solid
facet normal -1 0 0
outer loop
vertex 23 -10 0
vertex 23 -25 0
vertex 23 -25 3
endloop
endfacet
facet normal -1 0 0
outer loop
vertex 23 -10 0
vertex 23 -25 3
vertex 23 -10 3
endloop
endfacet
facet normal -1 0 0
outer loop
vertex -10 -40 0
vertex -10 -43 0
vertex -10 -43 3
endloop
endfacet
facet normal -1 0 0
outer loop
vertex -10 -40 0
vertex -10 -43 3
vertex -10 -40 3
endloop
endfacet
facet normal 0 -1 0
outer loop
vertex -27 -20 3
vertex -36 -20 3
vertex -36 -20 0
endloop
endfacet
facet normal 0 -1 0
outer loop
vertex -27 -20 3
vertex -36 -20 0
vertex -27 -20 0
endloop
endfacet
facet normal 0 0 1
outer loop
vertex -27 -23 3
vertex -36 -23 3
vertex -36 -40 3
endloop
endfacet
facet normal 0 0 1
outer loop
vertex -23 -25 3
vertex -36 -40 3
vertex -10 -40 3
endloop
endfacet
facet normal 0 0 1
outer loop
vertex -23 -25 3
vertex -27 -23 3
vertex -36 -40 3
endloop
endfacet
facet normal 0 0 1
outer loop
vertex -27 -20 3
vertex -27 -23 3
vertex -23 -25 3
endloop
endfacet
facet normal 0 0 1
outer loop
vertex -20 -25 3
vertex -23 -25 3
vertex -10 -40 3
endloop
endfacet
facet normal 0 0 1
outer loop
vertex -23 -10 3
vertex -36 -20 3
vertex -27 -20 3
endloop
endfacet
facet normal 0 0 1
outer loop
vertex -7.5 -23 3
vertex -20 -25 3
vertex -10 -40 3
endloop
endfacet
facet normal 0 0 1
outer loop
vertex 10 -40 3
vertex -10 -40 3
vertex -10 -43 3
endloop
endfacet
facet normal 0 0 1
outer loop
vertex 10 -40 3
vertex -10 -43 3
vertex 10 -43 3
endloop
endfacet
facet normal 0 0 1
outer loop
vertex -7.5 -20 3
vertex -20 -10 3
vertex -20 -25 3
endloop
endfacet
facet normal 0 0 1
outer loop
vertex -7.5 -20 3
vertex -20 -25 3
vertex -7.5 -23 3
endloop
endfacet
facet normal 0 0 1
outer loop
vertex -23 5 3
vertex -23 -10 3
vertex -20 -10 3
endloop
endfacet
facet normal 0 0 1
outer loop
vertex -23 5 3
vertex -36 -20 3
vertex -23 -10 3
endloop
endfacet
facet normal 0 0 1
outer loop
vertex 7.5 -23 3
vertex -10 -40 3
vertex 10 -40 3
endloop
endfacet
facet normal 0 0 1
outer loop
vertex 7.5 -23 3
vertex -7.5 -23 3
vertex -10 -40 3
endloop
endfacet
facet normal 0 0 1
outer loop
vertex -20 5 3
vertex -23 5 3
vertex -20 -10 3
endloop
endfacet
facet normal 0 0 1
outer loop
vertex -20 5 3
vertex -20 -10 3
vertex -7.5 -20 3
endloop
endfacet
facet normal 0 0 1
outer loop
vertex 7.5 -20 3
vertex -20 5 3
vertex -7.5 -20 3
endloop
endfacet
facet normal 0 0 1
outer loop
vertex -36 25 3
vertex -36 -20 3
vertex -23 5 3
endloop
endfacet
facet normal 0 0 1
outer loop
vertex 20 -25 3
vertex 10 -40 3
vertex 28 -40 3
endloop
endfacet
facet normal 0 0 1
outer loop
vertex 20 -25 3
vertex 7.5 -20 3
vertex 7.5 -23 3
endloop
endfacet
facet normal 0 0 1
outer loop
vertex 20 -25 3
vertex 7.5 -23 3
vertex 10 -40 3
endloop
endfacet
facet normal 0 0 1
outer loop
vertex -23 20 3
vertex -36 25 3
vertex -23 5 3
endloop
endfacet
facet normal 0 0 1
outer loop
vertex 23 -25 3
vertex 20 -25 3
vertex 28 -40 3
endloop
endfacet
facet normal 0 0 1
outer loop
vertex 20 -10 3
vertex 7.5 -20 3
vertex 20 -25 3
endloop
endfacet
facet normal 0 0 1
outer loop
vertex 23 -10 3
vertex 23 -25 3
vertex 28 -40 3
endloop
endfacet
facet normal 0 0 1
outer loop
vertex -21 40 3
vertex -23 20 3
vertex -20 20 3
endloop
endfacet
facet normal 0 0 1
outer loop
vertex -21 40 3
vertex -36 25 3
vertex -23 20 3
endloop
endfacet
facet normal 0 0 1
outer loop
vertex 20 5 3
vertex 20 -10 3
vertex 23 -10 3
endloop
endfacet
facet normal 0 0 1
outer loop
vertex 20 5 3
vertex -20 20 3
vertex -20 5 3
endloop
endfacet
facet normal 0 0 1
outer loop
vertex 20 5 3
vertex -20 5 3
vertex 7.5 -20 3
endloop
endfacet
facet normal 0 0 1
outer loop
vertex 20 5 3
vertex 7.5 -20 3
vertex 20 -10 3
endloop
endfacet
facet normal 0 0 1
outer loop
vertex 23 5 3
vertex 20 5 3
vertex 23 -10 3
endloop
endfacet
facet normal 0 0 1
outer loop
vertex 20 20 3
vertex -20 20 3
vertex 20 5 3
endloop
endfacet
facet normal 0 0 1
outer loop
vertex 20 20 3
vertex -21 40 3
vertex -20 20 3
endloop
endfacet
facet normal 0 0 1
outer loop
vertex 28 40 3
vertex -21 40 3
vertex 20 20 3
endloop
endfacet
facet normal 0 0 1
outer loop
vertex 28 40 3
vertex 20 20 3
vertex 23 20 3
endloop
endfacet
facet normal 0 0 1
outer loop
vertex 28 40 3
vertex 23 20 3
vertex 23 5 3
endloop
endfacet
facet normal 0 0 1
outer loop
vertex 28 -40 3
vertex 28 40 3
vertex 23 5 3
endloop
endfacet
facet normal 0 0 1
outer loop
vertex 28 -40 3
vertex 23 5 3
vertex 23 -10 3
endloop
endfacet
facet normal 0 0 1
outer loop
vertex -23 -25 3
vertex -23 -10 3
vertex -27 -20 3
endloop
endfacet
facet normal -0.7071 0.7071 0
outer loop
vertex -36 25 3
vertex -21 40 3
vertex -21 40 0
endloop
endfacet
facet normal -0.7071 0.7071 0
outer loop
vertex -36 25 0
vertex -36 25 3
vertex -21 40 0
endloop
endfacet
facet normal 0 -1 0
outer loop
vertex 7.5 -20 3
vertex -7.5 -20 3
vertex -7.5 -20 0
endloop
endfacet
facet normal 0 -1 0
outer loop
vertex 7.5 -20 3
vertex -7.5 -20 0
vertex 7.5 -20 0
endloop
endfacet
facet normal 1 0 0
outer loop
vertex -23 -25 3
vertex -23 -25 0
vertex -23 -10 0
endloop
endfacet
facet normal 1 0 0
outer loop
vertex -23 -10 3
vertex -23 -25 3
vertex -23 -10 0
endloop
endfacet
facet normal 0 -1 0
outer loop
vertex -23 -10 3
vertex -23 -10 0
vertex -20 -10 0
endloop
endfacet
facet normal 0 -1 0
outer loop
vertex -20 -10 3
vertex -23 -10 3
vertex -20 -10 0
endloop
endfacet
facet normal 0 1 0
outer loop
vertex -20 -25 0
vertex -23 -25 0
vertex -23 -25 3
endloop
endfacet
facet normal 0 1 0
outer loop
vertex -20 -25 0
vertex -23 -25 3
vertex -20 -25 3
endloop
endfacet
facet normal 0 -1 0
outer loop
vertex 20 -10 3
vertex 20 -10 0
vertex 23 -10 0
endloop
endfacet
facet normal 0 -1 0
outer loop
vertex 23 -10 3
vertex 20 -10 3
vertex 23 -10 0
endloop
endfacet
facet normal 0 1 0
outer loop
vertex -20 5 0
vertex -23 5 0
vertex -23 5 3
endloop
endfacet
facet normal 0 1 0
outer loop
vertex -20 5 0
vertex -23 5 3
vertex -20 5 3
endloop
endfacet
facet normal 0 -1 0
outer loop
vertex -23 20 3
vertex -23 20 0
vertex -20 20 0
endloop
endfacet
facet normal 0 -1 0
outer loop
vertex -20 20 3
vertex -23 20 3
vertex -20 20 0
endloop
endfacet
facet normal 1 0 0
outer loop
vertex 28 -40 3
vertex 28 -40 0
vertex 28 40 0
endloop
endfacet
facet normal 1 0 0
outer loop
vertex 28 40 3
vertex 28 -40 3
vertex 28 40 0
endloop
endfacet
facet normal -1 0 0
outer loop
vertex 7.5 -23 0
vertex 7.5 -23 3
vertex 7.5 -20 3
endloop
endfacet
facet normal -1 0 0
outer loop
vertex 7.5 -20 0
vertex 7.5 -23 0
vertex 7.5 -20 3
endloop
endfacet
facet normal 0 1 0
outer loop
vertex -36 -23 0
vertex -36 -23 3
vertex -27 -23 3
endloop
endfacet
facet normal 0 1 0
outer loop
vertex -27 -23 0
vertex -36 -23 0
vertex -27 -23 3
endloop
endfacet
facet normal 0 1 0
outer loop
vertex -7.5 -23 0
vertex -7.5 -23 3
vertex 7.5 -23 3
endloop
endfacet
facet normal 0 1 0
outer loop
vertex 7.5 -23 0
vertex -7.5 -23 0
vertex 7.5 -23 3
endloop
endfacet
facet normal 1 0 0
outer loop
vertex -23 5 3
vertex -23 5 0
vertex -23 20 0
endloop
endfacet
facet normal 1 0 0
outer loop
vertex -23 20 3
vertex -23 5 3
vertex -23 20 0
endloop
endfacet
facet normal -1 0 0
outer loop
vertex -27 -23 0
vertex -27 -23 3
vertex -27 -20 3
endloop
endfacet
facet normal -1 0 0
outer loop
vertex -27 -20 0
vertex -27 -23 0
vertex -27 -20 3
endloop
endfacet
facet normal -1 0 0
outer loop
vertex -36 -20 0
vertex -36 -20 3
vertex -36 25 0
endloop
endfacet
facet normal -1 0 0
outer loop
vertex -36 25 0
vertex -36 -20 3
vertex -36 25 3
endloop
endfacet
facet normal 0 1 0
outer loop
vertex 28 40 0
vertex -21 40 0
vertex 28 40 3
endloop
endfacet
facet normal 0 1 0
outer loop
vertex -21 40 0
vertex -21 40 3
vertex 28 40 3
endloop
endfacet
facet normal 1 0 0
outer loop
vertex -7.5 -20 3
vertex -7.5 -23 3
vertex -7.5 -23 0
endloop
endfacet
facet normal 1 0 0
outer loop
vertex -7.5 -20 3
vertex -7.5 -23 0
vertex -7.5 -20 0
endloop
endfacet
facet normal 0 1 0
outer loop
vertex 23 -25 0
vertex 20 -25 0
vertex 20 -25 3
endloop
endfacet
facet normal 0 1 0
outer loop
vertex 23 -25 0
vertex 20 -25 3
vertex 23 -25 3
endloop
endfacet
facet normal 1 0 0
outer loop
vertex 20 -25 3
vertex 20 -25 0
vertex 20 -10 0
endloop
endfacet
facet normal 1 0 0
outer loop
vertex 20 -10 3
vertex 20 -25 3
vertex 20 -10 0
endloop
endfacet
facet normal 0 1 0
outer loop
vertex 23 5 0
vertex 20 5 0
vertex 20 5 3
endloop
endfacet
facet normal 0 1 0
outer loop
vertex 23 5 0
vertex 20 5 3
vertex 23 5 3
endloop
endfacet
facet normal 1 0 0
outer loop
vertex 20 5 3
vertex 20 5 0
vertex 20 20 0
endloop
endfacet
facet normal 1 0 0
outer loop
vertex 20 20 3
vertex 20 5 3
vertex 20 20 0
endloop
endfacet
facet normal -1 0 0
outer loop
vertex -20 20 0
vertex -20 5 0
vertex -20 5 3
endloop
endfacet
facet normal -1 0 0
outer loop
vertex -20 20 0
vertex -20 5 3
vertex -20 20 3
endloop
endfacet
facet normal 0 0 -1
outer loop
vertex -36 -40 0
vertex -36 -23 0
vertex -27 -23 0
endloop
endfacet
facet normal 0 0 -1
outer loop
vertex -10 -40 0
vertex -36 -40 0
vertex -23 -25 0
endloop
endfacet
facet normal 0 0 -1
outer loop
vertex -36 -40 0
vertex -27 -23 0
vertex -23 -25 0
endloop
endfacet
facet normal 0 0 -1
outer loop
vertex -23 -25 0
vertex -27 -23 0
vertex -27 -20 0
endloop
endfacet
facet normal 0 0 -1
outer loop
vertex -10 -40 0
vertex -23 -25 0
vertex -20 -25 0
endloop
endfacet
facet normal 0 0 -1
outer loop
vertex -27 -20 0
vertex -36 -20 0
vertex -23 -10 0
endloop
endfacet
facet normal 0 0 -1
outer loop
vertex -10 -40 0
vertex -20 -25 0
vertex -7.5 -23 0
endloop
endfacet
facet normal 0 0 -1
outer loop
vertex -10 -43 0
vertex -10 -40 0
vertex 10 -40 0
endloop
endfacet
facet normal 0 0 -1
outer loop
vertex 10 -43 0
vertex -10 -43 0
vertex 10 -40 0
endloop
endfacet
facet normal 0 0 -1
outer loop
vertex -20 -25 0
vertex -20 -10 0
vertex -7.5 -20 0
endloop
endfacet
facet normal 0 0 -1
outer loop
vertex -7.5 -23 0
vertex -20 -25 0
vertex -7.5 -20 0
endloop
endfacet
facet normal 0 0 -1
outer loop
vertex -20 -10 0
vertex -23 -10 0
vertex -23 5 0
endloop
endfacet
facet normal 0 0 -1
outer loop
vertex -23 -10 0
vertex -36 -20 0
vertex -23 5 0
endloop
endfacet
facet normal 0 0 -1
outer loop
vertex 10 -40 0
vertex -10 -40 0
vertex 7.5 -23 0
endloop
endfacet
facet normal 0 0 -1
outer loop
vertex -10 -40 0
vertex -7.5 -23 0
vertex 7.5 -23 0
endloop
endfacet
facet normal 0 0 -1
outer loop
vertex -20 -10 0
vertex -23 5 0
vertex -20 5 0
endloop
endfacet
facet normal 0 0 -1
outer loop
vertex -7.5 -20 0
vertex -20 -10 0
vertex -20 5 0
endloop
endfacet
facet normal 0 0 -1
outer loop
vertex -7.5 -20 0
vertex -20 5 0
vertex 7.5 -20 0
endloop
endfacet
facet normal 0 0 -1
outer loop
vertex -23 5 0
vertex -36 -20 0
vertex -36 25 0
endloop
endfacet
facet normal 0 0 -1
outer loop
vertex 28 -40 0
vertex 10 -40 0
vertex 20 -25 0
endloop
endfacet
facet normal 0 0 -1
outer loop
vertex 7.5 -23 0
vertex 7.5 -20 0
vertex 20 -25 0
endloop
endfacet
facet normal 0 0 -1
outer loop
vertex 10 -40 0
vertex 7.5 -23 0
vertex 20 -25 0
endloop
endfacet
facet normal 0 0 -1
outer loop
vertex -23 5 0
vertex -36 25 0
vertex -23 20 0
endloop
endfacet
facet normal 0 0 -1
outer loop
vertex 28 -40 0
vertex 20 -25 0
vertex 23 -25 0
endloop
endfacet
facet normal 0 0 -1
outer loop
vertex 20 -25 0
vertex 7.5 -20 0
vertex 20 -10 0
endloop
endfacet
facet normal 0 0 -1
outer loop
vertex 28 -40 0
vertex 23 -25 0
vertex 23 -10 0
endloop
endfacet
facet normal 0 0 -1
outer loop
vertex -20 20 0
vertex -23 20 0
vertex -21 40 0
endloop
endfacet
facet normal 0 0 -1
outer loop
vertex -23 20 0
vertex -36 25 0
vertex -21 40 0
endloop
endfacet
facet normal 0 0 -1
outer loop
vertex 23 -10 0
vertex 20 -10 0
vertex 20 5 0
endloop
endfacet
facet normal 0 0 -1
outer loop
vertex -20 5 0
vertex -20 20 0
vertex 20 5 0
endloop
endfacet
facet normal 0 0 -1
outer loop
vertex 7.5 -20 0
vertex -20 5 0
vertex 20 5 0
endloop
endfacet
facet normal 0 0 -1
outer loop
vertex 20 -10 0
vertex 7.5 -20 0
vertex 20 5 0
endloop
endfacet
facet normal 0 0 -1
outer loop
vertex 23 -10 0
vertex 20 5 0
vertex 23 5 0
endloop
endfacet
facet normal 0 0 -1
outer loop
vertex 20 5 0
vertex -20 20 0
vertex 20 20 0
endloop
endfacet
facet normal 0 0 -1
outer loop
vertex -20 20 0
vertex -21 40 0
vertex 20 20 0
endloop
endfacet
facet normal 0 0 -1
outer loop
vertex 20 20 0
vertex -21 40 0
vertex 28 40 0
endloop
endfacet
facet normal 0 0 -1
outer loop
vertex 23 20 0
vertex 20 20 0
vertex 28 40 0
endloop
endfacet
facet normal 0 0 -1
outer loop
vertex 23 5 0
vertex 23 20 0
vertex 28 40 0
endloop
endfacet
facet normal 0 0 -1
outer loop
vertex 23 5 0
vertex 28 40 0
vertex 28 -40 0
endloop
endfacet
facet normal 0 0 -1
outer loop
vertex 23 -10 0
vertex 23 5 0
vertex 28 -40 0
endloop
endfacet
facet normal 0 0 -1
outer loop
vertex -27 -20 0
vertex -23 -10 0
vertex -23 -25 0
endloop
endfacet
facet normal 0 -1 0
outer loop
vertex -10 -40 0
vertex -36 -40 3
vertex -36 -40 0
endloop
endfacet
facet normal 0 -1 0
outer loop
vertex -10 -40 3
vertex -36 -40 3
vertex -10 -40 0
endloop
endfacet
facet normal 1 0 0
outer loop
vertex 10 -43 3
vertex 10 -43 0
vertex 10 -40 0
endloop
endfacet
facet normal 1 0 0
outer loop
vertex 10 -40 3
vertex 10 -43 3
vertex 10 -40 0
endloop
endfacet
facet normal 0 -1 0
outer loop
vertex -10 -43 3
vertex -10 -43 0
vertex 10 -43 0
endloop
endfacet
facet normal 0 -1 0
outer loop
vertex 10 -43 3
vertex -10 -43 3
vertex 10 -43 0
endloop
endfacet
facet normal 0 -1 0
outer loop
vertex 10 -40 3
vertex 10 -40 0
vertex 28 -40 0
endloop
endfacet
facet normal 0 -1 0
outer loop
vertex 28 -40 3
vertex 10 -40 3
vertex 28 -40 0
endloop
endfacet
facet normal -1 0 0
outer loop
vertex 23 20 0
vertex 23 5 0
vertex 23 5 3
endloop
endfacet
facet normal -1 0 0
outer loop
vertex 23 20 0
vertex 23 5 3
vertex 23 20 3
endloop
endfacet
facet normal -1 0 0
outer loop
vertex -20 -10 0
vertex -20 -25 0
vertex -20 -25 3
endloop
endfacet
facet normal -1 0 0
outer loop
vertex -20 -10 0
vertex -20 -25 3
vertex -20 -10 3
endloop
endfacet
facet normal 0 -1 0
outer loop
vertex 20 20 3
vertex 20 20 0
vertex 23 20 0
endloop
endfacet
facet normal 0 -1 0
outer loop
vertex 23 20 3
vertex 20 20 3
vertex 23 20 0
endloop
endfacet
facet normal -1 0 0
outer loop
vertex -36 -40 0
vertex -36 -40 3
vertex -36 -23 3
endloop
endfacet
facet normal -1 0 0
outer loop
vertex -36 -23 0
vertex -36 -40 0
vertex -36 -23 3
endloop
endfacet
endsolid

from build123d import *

# Parameters (mm, degrees)
SKETCH_1_W          = 56
SKETCH_1_H          = 80
SKETCH_1_W_2        = 3
SKETCH_1_H_2        = 15
SKETCH_1_W_3        = 20
SKETCH_1_H_3        = 3
EXTRUDE_1_DEPTH     = 3
SKETCH_2_W          = 15
SKETCH_2_H          = 3
CUT_EXTRUDE_1_DEPTH = 3
SKETCH_3_W          = 8
SKETCH_3_H          = 80
EXTRUDE_2_DEPTH     = 3
SKETCH_4_W          = 9
SKETCH_4_H          = 3
CUT_EXTRUDE_2_DEPTH = 3
CHAMFER_1_SIZE      = 15


with BuildPart() as part:
    # 草图1 → 凸台-拉伸1 (new body)
    # profile 1 of 2: a face of its own
    with BuildSketch(Plane.XY):
        Rectangle(SKETCH_1_W, SKETCH_1_H)
        with Locations((21.5, 12.5)):
            Rectangle(SKETCH_1_W_2, SKETCH_1_H_2, mode=Mode.SUBTRACT)
        with Locations((21.5, -17.5)):
            Rectangle(SKETCH_1_W_2, SKETCH_1_H_2, mode=Mode.SUBTRACT)
        with Locations((-21.5, -17.5)):
            Rectangle(SKETCH_1_W_2, SKETCH_1_H_2, mode=Mode.SUBTRACT)
        with Locations((-21.5, 12.5)):
            Rectangle(SKETCH_1_W_2, SKETCH_1_H_2, mode=Mode.SUBTRACT)
    # profile 2 of 2: a face of its own
    with BuildSketch(Plane.XY):
        with Locations((0, -41.5)):
            Rectangle(SKETCH_1_W_3, SKETCH_1_H_3)
    extrude(amount=EXTRUDE_1_DEPTH)

    # 草图2 → 切除-拉伸1 (cut)
    with BuildSketch(Plane.XY.offset(3)):
        with Locations((0, -21.5)):
            Rectangle(SKETCH_2_W, SKETCH_2_H)
    extrude(amount=-CUT_EXTRUDE_1_DEPTH, mode=Mode.SUBTRACT)

    # 草图3 → 凸台-拉伸2 (add)
    with BuildSketch(Plane.XY.offset(3)):
        with Locations((-32, 0)):
            Rectangle(SKETCH_3_W, SKETCH_3_H)
    extrude(amount=-EXTRUDE_2_DEPTH)

    # 草图4 → 切除-拉伸2 (cut)
    with BuildSketch(Plane.XY.offset(3)):
        with Locations((-31.5, -21.5)):
            Rectangle(SKETCH_4_W, SKETCH_4_H)
    extrude(amount=-CUT_EXTRUDE_2_DEPTH, mode=Mode.SUBTRACT)

    # 倒角1
    chamfer_1_edges = [part.edges().sort_by_distance(p)[0] for p in [
        (-36, 40, 1.5),
    ]]
    chamfer(chamfer_1_edges, length=CHAMFER_1_SIZE)


solid = part.part
